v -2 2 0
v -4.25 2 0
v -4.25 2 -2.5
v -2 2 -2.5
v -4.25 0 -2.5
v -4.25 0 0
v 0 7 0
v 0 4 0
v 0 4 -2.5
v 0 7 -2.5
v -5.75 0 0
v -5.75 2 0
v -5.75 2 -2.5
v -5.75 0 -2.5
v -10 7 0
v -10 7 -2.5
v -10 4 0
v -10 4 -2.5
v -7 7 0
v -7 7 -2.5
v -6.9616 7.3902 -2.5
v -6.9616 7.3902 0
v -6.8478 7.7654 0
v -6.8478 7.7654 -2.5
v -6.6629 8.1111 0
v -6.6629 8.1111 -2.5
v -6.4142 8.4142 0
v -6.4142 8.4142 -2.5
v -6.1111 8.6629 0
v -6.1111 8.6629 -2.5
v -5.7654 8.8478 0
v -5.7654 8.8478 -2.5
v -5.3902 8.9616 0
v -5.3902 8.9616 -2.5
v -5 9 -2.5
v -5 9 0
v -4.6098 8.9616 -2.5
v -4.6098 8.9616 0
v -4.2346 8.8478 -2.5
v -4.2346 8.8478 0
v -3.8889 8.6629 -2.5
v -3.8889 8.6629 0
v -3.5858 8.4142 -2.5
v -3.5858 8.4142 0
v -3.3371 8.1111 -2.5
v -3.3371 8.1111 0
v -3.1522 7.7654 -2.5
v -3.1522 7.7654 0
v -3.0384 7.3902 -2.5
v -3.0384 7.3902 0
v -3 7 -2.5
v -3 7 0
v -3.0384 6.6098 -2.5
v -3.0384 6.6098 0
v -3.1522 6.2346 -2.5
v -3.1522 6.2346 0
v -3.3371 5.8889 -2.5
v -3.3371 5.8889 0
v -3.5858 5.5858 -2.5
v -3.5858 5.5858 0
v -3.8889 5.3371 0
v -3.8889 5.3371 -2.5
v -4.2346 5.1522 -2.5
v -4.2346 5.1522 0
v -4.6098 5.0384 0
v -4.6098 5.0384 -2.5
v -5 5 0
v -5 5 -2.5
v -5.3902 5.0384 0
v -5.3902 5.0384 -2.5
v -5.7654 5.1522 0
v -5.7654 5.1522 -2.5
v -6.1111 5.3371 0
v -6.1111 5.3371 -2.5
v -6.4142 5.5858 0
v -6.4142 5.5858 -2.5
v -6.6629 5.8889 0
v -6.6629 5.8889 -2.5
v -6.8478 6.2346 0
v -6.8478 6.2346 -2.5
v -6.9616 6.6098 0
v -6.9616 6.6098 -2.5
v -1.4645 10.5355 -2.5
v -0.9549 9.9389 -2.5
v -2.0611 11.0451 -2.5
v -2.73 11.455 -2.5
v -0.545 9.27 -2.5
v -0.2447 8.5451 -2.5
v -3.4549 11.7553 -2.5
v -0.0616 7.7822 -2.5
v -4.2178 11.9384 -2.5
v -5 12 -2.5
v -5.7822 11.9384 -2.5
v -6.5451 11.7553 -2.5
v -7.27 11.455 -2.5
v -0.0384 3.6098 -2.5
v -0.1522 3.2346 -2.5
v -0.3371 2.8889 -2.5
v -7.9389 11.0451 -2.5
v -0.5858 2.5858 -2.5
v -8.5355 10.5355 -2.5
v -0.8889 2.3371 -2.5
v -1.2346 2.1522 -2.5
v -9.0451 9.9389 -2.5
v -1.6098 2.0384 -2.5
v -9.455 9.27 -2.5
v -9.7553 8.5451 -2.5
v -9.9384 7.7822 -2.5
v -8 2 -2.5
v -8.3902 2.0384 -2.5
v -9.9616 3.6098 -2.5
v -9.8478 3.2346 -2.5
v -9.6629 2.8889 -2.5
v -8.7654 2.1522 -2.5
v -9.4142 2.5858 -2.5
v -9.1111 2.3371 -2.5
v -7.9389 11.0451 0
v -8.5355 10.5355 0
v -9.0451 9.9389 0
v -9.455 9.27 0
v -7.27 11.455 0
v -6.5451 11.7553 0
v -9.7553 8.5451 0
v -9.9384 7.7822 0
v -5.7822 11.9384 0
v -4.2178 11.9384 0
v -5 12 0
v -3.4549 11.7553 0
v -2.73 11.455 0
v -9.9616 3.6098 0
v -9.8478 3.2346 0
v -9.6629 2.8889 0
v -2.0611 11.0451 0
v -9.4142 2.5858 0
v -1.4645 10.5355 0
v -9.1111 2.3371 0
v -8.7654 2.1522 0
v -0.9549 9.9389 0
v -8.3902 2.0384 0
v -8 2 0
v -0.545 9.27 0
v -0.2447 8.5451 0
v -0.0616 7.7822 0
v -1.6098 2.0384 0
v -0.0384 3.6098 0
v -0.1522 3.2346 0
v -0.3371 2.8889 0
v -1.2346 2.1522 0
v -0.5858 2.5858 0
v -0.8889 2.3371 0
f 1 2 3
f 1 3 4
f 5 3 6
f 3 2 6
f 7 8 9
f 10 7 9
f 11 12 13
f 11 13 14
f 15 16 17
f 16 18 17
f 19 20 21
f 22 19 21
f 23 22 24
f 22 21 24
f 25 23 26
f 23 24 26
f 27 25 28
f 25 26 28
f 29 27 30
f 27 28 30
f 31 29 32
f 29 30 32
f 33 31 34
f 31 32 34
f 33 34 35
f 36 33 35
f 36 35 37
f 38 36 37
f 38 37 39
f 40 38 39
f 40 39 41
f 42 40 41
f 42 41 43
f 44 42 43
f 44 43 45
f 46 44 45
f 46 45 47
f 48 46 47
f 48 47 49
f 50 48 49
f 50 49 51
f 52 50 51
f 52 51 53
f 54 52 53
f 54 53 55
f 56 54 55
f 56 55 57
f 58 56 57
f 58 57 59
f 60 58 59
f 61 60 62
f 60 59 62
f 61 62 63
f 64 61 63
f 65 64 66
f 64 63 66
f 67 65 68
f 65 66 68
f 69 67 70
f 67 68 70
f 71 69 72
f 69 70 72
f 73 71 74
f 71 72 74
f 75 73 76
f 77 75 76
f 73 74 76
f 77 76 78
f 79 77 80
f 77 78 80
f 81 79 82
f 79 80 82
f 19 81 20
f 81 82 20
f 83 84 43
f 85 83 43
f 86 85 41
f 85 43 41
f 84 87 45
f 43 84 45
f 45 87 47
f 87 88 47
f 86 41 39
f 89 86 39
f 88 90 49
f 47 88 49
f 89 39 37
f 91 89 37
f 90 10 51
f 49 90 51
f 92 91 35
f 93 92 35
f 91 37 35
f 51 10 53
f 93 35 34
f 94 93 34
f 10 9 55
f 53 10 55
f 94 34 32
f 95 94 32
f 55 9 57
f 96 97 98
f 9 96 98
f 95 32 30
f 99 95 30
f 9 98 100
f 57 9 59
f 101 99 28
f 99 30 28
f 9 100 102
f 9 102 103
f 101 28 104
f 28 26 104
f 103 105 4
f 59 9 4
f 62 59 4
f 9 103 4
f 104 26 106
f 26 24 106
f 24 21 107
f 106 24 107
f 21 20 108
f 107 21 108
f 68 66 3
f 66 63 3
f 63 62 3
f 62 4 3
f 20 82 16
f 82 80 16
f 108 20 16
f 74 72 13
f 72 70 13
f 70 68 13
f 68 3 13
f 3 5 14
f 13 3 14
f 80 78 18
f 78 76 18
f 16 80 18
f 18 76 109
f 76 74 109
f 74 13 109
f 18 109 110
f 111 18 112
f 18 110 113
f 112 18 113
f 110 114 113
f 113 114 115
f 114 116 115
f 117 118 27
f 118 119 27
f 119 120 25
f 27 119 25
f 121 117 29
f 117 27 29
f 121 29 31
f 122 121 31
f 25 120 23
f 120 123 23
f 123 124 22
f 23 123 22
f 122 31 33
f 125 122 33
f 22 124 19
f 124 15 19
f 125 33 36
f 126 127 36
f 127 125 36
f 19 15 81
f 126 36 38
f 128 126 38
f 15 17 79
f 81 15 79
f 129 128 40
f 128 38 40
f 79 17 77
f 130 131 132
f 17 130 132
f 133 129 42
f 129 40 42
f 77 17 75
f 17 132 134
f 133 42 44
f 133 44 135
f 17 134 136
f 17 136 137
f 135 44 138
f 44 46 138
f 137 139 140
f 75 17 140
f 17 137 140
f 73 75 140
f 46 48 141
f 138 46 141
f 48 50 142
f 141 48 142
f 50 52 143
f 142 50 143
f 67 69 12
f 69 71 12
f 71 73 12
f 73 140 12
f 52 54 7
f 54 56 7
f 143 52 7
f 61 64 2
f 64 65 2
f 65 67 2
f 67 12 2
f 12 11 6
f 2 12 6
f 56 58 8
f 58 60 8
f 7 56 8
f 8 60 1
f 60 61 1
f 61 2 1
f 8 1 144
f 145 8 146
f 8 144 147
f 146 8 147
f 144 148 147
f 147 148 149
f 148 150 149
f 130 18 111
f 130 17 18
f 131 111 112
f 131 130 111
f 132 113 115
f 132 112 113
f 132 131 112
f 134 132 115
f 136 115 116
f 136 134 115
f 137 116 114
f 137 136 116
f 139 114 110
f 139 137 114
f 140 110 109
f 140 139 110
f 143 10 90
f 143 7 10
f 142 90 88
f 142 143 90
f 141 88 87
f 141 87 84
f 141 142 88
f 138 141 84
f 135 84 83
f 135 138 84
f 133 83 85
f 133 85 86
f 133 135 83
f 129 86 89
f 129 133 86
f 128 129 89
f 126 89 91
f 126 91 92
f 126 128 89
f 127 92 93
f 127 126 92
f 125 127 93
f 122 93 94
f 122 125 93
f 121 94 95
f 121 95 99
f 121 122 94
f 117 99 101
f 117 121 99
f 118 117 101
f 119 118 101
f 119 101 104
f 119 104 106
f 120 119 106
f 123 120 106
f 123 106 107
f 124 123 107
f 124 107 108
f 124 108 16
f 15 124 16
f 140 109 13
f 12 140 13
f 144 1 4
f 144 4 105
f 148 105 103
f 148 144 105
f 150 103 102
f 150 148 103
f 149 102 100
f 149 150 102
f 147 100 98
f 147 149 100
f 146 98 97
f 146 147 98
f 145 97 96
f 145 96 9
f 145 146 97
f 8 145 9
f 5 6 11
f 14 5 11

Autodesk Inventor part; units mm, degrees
ref_plane "YZ Plane" through (0, 0, 0) normal (1, 0, 0) x (0, 1, 0)
ref_plane "XZ Plane" through (0, 0, 0) normal (0, 1, 0) x (-1, 0, 0)
ref_plane "XY Plane" through (0, 0, 0) normal (0, 0, 1) x (1, 0, 0)
sketch "Sketch1" plane through (0, 0, 0) normal (0, 1, 0) x (-1, 0, 0)
  line L0 (0, 0) -> (0, -2.5)
  line L1 (0, -2.5) -> (10, -2.5)
  line L2 (10, -2.5) -> (10, 0)
  line L3 (10, 0) -> (0, 0)
  dimension "d0" = 2.5
  dimension "d1" = 10
  dimension "d2" = 90
  dimension "d3" = 2.5
extrude "Extrusion1" add sketch "Sketch1" along normal blind 12
sketch "Sketch4" plane through (0, 0, -2.5) normal (0, 0, -1) x (-1, 0, 0)
  line L0 (0, 0) -> (0, 2)
  line L1 (0, 0) -> (0, 12) projected
  line L2 (0, 2) -> (4, 2)
  line L3 (10, 0) -> (10, 12) projected
  line L4 (4, 2) -> (0, 0)
  line L5 (0, 0) -> (10, 0) projected
  line L6 (10, 0) -> (10, 2)
  line L7 (10, 2) -> (6, 2)
  line L8 (6, 2) -> (10, 0)
  dimension "d9" = 2
  dimension "d10" = 4
  dimension "d11" = 2
  dimension "d12" = 4
extrude "Extrusion3" cut sketch "Sketch4" against normal up to surface (2.5 mm away)
sketch "Sketch5" plane through (0, 12, -2.5) normal (0, 0, -1) x (-1, 0, 0)
  point P0 (0, -12)
sketch "Sketch6" plane through (0, 12, -2.5) normal (0, 0, -1) x (-1, 0, 0)
  line L0 (0, -10) -> (0, 0) projected
  line L1 (0, -5) -> (10, -5)
  line L2 (10, -10) -> (10, 0) projected
  line L3 (0, 0) -> (10, 0) projected
  line L4 (5, 0) -> (5, -10)
  circle A0 centre (5, -5) radius 2
  point P0 (0, -12)
  dimension "d15" = 4
extrude "Extrusion4" cut sketch "Sketch6" against normal up to surface (2.5 mm away) contours A0 L4 L1 | L1 L4 A0 | L4 A0 L1 | L1 A0 L4
fillet "Fillet1" radius 2 4 edges at (0, 12, -1.25) (0, 2, -1.25) (-10, 12, -1.25) (-10, 2, -1.25)
fillet "Fillet2" radius 0.5 1 edges at (0, 0, -1.25)
fillet "Fillet3" radius 0.5 1 edges at (-10, 0, -1.25)
sketch "Sketch7" plane through (-8, 12, 0) normal (0, 0, 1) x (1, 0, 0)
  circle A0 centre (3, -5) radius 2 projected
  arc A1 (8, -2) -> (6, 0) centre (6, -2) ccw projected
  circle A2 centre (3, -5) radius 5
  line L0 (6, 0) -> (0, 0) projected
  arc A3 (-0.1056, -11.0528) -> (0.118, -12) centre (0.118, -11.5) ccw projected
  line L1 (0.118, -12) -> (5.882, -12) projected
  arc A4 (5.882, -12) -> (6.1056, -11.0528) centre (5.882, -11.5) ccw projected
  line L2 (6.1056, -11.0528) -> (4, -10) projected
  line L3 (4, -10) -> (6, -10) projected
  arc A5 (6, -10) -> (8, -8) centre (6, -8) ccw projected
  line L4 (8, -8) -> (8, -2) projected
  arc A6 (8, -2) -> (6, 0) centre (6, -2) ccw projected
  line L5 (0, 0) -> (6, 0) projected
  arc A7 (0, 0) -> (-2, -2) centre (0, -2) ccw projected
  line L6 (-2, -8) -> (-2, -2) projected
  arc A8 (-2, -8) -> (0, -10) centre (0, -8) ccw projected
  line L7 (0, -10) -> (2, -10) projected
  line L8 (2, -10) -> (-0.1056, -11.0528) projected
  circle A9 centre (3, -5) radius 2 projected
  point P0 (8, -12)
  point P1 (-2, -5)
  point P2 (3, 0)
  point P3 (8, -5)
  point P4 (8, -2)
extrude "Extrusion5" cut sketch "Sketch7" against normal up to surface (2.5 mm away) contours L4 A2 L0 A1 | A2 L6 A7 L0
sketch "Sketch8" plane through (-8, 2, 0) normal (0, 0, 1) x (1, 0, 0)
  circle A0 centre (3, 5) radius 2 projected
  arc A1 (8, 5) -> (-2, 5) centre (3, 5) ccw projected
  line L0 (-2, 2) -> (-2, 5) projected
  arc A2 (-2, 2) -> (0, 0) centre (0, 2) ccw projected
  line L1 (0, 0) -> (2, 0) projected
  line L2 (2, 0) -> (-0.1056, -1.0528) projected
  arc A3 (-0.1056, -1.0528) -> (0.118, -2) centre (0.118, -1.5) ccw projected
  line L3 (0.118, -2) -> (5.882, -2) projected
  arc A4 (5.882, -2) -> (6.1056, -1.0528) centre (5.882, -1.5) ccw projected
  line L4 (6.1056, -1.0528) -> (4, 0) projected
  line L5 (4, 0) -> (6, 0) projected
  arc A5 (6, 0) -> (8, 2) centre (6, 2) ccw projected
  line L6 (8, 2) -> (8, 5) projected
  line L7 (2, 0) -> (0, 0) projected
  line L8 (2, 0) -> (2, -2)
  line L9 (5.882, -2) -> (0.118, -2) projected
  line L10 (4, 0) -> (4, -2)
  line L11 (3, 0) -> (2.25, 0)
  line L12 (3, 0) -> (3.75, 0)
  line L13 (3.75, 0) -> (3.75, -2)
  line L14 (2.25, 0) -> (2.25, -2)
  line L15 (2.25, -2) -> (3.75, -2)
  line L16 (-0.1056, -1.0528) -> (2, 0) projected
  line L17 (2, 0) -> (4, 0)
  line L18 (2, -2) -> (4, -2)
  point P0 (8, -2)
  point P1 (2, -2)
  point P2 (2.25, 0)
  point P3 (2.25, -2)
  point P4 (3.75, 0)
  dimension "d25" = 0.75
  dimension "d26" = 0.75
extrude "Extrusion6" cut sketch "Sketch8" against normal up to surface (2.5 mm away) contours L4 A4 L3 L10 | L10 L3 L13 L17 | L8 L3 A3 L2 | L17 L14 L3 L8
properties part number "Knuckle Attachment DirectInsert"
